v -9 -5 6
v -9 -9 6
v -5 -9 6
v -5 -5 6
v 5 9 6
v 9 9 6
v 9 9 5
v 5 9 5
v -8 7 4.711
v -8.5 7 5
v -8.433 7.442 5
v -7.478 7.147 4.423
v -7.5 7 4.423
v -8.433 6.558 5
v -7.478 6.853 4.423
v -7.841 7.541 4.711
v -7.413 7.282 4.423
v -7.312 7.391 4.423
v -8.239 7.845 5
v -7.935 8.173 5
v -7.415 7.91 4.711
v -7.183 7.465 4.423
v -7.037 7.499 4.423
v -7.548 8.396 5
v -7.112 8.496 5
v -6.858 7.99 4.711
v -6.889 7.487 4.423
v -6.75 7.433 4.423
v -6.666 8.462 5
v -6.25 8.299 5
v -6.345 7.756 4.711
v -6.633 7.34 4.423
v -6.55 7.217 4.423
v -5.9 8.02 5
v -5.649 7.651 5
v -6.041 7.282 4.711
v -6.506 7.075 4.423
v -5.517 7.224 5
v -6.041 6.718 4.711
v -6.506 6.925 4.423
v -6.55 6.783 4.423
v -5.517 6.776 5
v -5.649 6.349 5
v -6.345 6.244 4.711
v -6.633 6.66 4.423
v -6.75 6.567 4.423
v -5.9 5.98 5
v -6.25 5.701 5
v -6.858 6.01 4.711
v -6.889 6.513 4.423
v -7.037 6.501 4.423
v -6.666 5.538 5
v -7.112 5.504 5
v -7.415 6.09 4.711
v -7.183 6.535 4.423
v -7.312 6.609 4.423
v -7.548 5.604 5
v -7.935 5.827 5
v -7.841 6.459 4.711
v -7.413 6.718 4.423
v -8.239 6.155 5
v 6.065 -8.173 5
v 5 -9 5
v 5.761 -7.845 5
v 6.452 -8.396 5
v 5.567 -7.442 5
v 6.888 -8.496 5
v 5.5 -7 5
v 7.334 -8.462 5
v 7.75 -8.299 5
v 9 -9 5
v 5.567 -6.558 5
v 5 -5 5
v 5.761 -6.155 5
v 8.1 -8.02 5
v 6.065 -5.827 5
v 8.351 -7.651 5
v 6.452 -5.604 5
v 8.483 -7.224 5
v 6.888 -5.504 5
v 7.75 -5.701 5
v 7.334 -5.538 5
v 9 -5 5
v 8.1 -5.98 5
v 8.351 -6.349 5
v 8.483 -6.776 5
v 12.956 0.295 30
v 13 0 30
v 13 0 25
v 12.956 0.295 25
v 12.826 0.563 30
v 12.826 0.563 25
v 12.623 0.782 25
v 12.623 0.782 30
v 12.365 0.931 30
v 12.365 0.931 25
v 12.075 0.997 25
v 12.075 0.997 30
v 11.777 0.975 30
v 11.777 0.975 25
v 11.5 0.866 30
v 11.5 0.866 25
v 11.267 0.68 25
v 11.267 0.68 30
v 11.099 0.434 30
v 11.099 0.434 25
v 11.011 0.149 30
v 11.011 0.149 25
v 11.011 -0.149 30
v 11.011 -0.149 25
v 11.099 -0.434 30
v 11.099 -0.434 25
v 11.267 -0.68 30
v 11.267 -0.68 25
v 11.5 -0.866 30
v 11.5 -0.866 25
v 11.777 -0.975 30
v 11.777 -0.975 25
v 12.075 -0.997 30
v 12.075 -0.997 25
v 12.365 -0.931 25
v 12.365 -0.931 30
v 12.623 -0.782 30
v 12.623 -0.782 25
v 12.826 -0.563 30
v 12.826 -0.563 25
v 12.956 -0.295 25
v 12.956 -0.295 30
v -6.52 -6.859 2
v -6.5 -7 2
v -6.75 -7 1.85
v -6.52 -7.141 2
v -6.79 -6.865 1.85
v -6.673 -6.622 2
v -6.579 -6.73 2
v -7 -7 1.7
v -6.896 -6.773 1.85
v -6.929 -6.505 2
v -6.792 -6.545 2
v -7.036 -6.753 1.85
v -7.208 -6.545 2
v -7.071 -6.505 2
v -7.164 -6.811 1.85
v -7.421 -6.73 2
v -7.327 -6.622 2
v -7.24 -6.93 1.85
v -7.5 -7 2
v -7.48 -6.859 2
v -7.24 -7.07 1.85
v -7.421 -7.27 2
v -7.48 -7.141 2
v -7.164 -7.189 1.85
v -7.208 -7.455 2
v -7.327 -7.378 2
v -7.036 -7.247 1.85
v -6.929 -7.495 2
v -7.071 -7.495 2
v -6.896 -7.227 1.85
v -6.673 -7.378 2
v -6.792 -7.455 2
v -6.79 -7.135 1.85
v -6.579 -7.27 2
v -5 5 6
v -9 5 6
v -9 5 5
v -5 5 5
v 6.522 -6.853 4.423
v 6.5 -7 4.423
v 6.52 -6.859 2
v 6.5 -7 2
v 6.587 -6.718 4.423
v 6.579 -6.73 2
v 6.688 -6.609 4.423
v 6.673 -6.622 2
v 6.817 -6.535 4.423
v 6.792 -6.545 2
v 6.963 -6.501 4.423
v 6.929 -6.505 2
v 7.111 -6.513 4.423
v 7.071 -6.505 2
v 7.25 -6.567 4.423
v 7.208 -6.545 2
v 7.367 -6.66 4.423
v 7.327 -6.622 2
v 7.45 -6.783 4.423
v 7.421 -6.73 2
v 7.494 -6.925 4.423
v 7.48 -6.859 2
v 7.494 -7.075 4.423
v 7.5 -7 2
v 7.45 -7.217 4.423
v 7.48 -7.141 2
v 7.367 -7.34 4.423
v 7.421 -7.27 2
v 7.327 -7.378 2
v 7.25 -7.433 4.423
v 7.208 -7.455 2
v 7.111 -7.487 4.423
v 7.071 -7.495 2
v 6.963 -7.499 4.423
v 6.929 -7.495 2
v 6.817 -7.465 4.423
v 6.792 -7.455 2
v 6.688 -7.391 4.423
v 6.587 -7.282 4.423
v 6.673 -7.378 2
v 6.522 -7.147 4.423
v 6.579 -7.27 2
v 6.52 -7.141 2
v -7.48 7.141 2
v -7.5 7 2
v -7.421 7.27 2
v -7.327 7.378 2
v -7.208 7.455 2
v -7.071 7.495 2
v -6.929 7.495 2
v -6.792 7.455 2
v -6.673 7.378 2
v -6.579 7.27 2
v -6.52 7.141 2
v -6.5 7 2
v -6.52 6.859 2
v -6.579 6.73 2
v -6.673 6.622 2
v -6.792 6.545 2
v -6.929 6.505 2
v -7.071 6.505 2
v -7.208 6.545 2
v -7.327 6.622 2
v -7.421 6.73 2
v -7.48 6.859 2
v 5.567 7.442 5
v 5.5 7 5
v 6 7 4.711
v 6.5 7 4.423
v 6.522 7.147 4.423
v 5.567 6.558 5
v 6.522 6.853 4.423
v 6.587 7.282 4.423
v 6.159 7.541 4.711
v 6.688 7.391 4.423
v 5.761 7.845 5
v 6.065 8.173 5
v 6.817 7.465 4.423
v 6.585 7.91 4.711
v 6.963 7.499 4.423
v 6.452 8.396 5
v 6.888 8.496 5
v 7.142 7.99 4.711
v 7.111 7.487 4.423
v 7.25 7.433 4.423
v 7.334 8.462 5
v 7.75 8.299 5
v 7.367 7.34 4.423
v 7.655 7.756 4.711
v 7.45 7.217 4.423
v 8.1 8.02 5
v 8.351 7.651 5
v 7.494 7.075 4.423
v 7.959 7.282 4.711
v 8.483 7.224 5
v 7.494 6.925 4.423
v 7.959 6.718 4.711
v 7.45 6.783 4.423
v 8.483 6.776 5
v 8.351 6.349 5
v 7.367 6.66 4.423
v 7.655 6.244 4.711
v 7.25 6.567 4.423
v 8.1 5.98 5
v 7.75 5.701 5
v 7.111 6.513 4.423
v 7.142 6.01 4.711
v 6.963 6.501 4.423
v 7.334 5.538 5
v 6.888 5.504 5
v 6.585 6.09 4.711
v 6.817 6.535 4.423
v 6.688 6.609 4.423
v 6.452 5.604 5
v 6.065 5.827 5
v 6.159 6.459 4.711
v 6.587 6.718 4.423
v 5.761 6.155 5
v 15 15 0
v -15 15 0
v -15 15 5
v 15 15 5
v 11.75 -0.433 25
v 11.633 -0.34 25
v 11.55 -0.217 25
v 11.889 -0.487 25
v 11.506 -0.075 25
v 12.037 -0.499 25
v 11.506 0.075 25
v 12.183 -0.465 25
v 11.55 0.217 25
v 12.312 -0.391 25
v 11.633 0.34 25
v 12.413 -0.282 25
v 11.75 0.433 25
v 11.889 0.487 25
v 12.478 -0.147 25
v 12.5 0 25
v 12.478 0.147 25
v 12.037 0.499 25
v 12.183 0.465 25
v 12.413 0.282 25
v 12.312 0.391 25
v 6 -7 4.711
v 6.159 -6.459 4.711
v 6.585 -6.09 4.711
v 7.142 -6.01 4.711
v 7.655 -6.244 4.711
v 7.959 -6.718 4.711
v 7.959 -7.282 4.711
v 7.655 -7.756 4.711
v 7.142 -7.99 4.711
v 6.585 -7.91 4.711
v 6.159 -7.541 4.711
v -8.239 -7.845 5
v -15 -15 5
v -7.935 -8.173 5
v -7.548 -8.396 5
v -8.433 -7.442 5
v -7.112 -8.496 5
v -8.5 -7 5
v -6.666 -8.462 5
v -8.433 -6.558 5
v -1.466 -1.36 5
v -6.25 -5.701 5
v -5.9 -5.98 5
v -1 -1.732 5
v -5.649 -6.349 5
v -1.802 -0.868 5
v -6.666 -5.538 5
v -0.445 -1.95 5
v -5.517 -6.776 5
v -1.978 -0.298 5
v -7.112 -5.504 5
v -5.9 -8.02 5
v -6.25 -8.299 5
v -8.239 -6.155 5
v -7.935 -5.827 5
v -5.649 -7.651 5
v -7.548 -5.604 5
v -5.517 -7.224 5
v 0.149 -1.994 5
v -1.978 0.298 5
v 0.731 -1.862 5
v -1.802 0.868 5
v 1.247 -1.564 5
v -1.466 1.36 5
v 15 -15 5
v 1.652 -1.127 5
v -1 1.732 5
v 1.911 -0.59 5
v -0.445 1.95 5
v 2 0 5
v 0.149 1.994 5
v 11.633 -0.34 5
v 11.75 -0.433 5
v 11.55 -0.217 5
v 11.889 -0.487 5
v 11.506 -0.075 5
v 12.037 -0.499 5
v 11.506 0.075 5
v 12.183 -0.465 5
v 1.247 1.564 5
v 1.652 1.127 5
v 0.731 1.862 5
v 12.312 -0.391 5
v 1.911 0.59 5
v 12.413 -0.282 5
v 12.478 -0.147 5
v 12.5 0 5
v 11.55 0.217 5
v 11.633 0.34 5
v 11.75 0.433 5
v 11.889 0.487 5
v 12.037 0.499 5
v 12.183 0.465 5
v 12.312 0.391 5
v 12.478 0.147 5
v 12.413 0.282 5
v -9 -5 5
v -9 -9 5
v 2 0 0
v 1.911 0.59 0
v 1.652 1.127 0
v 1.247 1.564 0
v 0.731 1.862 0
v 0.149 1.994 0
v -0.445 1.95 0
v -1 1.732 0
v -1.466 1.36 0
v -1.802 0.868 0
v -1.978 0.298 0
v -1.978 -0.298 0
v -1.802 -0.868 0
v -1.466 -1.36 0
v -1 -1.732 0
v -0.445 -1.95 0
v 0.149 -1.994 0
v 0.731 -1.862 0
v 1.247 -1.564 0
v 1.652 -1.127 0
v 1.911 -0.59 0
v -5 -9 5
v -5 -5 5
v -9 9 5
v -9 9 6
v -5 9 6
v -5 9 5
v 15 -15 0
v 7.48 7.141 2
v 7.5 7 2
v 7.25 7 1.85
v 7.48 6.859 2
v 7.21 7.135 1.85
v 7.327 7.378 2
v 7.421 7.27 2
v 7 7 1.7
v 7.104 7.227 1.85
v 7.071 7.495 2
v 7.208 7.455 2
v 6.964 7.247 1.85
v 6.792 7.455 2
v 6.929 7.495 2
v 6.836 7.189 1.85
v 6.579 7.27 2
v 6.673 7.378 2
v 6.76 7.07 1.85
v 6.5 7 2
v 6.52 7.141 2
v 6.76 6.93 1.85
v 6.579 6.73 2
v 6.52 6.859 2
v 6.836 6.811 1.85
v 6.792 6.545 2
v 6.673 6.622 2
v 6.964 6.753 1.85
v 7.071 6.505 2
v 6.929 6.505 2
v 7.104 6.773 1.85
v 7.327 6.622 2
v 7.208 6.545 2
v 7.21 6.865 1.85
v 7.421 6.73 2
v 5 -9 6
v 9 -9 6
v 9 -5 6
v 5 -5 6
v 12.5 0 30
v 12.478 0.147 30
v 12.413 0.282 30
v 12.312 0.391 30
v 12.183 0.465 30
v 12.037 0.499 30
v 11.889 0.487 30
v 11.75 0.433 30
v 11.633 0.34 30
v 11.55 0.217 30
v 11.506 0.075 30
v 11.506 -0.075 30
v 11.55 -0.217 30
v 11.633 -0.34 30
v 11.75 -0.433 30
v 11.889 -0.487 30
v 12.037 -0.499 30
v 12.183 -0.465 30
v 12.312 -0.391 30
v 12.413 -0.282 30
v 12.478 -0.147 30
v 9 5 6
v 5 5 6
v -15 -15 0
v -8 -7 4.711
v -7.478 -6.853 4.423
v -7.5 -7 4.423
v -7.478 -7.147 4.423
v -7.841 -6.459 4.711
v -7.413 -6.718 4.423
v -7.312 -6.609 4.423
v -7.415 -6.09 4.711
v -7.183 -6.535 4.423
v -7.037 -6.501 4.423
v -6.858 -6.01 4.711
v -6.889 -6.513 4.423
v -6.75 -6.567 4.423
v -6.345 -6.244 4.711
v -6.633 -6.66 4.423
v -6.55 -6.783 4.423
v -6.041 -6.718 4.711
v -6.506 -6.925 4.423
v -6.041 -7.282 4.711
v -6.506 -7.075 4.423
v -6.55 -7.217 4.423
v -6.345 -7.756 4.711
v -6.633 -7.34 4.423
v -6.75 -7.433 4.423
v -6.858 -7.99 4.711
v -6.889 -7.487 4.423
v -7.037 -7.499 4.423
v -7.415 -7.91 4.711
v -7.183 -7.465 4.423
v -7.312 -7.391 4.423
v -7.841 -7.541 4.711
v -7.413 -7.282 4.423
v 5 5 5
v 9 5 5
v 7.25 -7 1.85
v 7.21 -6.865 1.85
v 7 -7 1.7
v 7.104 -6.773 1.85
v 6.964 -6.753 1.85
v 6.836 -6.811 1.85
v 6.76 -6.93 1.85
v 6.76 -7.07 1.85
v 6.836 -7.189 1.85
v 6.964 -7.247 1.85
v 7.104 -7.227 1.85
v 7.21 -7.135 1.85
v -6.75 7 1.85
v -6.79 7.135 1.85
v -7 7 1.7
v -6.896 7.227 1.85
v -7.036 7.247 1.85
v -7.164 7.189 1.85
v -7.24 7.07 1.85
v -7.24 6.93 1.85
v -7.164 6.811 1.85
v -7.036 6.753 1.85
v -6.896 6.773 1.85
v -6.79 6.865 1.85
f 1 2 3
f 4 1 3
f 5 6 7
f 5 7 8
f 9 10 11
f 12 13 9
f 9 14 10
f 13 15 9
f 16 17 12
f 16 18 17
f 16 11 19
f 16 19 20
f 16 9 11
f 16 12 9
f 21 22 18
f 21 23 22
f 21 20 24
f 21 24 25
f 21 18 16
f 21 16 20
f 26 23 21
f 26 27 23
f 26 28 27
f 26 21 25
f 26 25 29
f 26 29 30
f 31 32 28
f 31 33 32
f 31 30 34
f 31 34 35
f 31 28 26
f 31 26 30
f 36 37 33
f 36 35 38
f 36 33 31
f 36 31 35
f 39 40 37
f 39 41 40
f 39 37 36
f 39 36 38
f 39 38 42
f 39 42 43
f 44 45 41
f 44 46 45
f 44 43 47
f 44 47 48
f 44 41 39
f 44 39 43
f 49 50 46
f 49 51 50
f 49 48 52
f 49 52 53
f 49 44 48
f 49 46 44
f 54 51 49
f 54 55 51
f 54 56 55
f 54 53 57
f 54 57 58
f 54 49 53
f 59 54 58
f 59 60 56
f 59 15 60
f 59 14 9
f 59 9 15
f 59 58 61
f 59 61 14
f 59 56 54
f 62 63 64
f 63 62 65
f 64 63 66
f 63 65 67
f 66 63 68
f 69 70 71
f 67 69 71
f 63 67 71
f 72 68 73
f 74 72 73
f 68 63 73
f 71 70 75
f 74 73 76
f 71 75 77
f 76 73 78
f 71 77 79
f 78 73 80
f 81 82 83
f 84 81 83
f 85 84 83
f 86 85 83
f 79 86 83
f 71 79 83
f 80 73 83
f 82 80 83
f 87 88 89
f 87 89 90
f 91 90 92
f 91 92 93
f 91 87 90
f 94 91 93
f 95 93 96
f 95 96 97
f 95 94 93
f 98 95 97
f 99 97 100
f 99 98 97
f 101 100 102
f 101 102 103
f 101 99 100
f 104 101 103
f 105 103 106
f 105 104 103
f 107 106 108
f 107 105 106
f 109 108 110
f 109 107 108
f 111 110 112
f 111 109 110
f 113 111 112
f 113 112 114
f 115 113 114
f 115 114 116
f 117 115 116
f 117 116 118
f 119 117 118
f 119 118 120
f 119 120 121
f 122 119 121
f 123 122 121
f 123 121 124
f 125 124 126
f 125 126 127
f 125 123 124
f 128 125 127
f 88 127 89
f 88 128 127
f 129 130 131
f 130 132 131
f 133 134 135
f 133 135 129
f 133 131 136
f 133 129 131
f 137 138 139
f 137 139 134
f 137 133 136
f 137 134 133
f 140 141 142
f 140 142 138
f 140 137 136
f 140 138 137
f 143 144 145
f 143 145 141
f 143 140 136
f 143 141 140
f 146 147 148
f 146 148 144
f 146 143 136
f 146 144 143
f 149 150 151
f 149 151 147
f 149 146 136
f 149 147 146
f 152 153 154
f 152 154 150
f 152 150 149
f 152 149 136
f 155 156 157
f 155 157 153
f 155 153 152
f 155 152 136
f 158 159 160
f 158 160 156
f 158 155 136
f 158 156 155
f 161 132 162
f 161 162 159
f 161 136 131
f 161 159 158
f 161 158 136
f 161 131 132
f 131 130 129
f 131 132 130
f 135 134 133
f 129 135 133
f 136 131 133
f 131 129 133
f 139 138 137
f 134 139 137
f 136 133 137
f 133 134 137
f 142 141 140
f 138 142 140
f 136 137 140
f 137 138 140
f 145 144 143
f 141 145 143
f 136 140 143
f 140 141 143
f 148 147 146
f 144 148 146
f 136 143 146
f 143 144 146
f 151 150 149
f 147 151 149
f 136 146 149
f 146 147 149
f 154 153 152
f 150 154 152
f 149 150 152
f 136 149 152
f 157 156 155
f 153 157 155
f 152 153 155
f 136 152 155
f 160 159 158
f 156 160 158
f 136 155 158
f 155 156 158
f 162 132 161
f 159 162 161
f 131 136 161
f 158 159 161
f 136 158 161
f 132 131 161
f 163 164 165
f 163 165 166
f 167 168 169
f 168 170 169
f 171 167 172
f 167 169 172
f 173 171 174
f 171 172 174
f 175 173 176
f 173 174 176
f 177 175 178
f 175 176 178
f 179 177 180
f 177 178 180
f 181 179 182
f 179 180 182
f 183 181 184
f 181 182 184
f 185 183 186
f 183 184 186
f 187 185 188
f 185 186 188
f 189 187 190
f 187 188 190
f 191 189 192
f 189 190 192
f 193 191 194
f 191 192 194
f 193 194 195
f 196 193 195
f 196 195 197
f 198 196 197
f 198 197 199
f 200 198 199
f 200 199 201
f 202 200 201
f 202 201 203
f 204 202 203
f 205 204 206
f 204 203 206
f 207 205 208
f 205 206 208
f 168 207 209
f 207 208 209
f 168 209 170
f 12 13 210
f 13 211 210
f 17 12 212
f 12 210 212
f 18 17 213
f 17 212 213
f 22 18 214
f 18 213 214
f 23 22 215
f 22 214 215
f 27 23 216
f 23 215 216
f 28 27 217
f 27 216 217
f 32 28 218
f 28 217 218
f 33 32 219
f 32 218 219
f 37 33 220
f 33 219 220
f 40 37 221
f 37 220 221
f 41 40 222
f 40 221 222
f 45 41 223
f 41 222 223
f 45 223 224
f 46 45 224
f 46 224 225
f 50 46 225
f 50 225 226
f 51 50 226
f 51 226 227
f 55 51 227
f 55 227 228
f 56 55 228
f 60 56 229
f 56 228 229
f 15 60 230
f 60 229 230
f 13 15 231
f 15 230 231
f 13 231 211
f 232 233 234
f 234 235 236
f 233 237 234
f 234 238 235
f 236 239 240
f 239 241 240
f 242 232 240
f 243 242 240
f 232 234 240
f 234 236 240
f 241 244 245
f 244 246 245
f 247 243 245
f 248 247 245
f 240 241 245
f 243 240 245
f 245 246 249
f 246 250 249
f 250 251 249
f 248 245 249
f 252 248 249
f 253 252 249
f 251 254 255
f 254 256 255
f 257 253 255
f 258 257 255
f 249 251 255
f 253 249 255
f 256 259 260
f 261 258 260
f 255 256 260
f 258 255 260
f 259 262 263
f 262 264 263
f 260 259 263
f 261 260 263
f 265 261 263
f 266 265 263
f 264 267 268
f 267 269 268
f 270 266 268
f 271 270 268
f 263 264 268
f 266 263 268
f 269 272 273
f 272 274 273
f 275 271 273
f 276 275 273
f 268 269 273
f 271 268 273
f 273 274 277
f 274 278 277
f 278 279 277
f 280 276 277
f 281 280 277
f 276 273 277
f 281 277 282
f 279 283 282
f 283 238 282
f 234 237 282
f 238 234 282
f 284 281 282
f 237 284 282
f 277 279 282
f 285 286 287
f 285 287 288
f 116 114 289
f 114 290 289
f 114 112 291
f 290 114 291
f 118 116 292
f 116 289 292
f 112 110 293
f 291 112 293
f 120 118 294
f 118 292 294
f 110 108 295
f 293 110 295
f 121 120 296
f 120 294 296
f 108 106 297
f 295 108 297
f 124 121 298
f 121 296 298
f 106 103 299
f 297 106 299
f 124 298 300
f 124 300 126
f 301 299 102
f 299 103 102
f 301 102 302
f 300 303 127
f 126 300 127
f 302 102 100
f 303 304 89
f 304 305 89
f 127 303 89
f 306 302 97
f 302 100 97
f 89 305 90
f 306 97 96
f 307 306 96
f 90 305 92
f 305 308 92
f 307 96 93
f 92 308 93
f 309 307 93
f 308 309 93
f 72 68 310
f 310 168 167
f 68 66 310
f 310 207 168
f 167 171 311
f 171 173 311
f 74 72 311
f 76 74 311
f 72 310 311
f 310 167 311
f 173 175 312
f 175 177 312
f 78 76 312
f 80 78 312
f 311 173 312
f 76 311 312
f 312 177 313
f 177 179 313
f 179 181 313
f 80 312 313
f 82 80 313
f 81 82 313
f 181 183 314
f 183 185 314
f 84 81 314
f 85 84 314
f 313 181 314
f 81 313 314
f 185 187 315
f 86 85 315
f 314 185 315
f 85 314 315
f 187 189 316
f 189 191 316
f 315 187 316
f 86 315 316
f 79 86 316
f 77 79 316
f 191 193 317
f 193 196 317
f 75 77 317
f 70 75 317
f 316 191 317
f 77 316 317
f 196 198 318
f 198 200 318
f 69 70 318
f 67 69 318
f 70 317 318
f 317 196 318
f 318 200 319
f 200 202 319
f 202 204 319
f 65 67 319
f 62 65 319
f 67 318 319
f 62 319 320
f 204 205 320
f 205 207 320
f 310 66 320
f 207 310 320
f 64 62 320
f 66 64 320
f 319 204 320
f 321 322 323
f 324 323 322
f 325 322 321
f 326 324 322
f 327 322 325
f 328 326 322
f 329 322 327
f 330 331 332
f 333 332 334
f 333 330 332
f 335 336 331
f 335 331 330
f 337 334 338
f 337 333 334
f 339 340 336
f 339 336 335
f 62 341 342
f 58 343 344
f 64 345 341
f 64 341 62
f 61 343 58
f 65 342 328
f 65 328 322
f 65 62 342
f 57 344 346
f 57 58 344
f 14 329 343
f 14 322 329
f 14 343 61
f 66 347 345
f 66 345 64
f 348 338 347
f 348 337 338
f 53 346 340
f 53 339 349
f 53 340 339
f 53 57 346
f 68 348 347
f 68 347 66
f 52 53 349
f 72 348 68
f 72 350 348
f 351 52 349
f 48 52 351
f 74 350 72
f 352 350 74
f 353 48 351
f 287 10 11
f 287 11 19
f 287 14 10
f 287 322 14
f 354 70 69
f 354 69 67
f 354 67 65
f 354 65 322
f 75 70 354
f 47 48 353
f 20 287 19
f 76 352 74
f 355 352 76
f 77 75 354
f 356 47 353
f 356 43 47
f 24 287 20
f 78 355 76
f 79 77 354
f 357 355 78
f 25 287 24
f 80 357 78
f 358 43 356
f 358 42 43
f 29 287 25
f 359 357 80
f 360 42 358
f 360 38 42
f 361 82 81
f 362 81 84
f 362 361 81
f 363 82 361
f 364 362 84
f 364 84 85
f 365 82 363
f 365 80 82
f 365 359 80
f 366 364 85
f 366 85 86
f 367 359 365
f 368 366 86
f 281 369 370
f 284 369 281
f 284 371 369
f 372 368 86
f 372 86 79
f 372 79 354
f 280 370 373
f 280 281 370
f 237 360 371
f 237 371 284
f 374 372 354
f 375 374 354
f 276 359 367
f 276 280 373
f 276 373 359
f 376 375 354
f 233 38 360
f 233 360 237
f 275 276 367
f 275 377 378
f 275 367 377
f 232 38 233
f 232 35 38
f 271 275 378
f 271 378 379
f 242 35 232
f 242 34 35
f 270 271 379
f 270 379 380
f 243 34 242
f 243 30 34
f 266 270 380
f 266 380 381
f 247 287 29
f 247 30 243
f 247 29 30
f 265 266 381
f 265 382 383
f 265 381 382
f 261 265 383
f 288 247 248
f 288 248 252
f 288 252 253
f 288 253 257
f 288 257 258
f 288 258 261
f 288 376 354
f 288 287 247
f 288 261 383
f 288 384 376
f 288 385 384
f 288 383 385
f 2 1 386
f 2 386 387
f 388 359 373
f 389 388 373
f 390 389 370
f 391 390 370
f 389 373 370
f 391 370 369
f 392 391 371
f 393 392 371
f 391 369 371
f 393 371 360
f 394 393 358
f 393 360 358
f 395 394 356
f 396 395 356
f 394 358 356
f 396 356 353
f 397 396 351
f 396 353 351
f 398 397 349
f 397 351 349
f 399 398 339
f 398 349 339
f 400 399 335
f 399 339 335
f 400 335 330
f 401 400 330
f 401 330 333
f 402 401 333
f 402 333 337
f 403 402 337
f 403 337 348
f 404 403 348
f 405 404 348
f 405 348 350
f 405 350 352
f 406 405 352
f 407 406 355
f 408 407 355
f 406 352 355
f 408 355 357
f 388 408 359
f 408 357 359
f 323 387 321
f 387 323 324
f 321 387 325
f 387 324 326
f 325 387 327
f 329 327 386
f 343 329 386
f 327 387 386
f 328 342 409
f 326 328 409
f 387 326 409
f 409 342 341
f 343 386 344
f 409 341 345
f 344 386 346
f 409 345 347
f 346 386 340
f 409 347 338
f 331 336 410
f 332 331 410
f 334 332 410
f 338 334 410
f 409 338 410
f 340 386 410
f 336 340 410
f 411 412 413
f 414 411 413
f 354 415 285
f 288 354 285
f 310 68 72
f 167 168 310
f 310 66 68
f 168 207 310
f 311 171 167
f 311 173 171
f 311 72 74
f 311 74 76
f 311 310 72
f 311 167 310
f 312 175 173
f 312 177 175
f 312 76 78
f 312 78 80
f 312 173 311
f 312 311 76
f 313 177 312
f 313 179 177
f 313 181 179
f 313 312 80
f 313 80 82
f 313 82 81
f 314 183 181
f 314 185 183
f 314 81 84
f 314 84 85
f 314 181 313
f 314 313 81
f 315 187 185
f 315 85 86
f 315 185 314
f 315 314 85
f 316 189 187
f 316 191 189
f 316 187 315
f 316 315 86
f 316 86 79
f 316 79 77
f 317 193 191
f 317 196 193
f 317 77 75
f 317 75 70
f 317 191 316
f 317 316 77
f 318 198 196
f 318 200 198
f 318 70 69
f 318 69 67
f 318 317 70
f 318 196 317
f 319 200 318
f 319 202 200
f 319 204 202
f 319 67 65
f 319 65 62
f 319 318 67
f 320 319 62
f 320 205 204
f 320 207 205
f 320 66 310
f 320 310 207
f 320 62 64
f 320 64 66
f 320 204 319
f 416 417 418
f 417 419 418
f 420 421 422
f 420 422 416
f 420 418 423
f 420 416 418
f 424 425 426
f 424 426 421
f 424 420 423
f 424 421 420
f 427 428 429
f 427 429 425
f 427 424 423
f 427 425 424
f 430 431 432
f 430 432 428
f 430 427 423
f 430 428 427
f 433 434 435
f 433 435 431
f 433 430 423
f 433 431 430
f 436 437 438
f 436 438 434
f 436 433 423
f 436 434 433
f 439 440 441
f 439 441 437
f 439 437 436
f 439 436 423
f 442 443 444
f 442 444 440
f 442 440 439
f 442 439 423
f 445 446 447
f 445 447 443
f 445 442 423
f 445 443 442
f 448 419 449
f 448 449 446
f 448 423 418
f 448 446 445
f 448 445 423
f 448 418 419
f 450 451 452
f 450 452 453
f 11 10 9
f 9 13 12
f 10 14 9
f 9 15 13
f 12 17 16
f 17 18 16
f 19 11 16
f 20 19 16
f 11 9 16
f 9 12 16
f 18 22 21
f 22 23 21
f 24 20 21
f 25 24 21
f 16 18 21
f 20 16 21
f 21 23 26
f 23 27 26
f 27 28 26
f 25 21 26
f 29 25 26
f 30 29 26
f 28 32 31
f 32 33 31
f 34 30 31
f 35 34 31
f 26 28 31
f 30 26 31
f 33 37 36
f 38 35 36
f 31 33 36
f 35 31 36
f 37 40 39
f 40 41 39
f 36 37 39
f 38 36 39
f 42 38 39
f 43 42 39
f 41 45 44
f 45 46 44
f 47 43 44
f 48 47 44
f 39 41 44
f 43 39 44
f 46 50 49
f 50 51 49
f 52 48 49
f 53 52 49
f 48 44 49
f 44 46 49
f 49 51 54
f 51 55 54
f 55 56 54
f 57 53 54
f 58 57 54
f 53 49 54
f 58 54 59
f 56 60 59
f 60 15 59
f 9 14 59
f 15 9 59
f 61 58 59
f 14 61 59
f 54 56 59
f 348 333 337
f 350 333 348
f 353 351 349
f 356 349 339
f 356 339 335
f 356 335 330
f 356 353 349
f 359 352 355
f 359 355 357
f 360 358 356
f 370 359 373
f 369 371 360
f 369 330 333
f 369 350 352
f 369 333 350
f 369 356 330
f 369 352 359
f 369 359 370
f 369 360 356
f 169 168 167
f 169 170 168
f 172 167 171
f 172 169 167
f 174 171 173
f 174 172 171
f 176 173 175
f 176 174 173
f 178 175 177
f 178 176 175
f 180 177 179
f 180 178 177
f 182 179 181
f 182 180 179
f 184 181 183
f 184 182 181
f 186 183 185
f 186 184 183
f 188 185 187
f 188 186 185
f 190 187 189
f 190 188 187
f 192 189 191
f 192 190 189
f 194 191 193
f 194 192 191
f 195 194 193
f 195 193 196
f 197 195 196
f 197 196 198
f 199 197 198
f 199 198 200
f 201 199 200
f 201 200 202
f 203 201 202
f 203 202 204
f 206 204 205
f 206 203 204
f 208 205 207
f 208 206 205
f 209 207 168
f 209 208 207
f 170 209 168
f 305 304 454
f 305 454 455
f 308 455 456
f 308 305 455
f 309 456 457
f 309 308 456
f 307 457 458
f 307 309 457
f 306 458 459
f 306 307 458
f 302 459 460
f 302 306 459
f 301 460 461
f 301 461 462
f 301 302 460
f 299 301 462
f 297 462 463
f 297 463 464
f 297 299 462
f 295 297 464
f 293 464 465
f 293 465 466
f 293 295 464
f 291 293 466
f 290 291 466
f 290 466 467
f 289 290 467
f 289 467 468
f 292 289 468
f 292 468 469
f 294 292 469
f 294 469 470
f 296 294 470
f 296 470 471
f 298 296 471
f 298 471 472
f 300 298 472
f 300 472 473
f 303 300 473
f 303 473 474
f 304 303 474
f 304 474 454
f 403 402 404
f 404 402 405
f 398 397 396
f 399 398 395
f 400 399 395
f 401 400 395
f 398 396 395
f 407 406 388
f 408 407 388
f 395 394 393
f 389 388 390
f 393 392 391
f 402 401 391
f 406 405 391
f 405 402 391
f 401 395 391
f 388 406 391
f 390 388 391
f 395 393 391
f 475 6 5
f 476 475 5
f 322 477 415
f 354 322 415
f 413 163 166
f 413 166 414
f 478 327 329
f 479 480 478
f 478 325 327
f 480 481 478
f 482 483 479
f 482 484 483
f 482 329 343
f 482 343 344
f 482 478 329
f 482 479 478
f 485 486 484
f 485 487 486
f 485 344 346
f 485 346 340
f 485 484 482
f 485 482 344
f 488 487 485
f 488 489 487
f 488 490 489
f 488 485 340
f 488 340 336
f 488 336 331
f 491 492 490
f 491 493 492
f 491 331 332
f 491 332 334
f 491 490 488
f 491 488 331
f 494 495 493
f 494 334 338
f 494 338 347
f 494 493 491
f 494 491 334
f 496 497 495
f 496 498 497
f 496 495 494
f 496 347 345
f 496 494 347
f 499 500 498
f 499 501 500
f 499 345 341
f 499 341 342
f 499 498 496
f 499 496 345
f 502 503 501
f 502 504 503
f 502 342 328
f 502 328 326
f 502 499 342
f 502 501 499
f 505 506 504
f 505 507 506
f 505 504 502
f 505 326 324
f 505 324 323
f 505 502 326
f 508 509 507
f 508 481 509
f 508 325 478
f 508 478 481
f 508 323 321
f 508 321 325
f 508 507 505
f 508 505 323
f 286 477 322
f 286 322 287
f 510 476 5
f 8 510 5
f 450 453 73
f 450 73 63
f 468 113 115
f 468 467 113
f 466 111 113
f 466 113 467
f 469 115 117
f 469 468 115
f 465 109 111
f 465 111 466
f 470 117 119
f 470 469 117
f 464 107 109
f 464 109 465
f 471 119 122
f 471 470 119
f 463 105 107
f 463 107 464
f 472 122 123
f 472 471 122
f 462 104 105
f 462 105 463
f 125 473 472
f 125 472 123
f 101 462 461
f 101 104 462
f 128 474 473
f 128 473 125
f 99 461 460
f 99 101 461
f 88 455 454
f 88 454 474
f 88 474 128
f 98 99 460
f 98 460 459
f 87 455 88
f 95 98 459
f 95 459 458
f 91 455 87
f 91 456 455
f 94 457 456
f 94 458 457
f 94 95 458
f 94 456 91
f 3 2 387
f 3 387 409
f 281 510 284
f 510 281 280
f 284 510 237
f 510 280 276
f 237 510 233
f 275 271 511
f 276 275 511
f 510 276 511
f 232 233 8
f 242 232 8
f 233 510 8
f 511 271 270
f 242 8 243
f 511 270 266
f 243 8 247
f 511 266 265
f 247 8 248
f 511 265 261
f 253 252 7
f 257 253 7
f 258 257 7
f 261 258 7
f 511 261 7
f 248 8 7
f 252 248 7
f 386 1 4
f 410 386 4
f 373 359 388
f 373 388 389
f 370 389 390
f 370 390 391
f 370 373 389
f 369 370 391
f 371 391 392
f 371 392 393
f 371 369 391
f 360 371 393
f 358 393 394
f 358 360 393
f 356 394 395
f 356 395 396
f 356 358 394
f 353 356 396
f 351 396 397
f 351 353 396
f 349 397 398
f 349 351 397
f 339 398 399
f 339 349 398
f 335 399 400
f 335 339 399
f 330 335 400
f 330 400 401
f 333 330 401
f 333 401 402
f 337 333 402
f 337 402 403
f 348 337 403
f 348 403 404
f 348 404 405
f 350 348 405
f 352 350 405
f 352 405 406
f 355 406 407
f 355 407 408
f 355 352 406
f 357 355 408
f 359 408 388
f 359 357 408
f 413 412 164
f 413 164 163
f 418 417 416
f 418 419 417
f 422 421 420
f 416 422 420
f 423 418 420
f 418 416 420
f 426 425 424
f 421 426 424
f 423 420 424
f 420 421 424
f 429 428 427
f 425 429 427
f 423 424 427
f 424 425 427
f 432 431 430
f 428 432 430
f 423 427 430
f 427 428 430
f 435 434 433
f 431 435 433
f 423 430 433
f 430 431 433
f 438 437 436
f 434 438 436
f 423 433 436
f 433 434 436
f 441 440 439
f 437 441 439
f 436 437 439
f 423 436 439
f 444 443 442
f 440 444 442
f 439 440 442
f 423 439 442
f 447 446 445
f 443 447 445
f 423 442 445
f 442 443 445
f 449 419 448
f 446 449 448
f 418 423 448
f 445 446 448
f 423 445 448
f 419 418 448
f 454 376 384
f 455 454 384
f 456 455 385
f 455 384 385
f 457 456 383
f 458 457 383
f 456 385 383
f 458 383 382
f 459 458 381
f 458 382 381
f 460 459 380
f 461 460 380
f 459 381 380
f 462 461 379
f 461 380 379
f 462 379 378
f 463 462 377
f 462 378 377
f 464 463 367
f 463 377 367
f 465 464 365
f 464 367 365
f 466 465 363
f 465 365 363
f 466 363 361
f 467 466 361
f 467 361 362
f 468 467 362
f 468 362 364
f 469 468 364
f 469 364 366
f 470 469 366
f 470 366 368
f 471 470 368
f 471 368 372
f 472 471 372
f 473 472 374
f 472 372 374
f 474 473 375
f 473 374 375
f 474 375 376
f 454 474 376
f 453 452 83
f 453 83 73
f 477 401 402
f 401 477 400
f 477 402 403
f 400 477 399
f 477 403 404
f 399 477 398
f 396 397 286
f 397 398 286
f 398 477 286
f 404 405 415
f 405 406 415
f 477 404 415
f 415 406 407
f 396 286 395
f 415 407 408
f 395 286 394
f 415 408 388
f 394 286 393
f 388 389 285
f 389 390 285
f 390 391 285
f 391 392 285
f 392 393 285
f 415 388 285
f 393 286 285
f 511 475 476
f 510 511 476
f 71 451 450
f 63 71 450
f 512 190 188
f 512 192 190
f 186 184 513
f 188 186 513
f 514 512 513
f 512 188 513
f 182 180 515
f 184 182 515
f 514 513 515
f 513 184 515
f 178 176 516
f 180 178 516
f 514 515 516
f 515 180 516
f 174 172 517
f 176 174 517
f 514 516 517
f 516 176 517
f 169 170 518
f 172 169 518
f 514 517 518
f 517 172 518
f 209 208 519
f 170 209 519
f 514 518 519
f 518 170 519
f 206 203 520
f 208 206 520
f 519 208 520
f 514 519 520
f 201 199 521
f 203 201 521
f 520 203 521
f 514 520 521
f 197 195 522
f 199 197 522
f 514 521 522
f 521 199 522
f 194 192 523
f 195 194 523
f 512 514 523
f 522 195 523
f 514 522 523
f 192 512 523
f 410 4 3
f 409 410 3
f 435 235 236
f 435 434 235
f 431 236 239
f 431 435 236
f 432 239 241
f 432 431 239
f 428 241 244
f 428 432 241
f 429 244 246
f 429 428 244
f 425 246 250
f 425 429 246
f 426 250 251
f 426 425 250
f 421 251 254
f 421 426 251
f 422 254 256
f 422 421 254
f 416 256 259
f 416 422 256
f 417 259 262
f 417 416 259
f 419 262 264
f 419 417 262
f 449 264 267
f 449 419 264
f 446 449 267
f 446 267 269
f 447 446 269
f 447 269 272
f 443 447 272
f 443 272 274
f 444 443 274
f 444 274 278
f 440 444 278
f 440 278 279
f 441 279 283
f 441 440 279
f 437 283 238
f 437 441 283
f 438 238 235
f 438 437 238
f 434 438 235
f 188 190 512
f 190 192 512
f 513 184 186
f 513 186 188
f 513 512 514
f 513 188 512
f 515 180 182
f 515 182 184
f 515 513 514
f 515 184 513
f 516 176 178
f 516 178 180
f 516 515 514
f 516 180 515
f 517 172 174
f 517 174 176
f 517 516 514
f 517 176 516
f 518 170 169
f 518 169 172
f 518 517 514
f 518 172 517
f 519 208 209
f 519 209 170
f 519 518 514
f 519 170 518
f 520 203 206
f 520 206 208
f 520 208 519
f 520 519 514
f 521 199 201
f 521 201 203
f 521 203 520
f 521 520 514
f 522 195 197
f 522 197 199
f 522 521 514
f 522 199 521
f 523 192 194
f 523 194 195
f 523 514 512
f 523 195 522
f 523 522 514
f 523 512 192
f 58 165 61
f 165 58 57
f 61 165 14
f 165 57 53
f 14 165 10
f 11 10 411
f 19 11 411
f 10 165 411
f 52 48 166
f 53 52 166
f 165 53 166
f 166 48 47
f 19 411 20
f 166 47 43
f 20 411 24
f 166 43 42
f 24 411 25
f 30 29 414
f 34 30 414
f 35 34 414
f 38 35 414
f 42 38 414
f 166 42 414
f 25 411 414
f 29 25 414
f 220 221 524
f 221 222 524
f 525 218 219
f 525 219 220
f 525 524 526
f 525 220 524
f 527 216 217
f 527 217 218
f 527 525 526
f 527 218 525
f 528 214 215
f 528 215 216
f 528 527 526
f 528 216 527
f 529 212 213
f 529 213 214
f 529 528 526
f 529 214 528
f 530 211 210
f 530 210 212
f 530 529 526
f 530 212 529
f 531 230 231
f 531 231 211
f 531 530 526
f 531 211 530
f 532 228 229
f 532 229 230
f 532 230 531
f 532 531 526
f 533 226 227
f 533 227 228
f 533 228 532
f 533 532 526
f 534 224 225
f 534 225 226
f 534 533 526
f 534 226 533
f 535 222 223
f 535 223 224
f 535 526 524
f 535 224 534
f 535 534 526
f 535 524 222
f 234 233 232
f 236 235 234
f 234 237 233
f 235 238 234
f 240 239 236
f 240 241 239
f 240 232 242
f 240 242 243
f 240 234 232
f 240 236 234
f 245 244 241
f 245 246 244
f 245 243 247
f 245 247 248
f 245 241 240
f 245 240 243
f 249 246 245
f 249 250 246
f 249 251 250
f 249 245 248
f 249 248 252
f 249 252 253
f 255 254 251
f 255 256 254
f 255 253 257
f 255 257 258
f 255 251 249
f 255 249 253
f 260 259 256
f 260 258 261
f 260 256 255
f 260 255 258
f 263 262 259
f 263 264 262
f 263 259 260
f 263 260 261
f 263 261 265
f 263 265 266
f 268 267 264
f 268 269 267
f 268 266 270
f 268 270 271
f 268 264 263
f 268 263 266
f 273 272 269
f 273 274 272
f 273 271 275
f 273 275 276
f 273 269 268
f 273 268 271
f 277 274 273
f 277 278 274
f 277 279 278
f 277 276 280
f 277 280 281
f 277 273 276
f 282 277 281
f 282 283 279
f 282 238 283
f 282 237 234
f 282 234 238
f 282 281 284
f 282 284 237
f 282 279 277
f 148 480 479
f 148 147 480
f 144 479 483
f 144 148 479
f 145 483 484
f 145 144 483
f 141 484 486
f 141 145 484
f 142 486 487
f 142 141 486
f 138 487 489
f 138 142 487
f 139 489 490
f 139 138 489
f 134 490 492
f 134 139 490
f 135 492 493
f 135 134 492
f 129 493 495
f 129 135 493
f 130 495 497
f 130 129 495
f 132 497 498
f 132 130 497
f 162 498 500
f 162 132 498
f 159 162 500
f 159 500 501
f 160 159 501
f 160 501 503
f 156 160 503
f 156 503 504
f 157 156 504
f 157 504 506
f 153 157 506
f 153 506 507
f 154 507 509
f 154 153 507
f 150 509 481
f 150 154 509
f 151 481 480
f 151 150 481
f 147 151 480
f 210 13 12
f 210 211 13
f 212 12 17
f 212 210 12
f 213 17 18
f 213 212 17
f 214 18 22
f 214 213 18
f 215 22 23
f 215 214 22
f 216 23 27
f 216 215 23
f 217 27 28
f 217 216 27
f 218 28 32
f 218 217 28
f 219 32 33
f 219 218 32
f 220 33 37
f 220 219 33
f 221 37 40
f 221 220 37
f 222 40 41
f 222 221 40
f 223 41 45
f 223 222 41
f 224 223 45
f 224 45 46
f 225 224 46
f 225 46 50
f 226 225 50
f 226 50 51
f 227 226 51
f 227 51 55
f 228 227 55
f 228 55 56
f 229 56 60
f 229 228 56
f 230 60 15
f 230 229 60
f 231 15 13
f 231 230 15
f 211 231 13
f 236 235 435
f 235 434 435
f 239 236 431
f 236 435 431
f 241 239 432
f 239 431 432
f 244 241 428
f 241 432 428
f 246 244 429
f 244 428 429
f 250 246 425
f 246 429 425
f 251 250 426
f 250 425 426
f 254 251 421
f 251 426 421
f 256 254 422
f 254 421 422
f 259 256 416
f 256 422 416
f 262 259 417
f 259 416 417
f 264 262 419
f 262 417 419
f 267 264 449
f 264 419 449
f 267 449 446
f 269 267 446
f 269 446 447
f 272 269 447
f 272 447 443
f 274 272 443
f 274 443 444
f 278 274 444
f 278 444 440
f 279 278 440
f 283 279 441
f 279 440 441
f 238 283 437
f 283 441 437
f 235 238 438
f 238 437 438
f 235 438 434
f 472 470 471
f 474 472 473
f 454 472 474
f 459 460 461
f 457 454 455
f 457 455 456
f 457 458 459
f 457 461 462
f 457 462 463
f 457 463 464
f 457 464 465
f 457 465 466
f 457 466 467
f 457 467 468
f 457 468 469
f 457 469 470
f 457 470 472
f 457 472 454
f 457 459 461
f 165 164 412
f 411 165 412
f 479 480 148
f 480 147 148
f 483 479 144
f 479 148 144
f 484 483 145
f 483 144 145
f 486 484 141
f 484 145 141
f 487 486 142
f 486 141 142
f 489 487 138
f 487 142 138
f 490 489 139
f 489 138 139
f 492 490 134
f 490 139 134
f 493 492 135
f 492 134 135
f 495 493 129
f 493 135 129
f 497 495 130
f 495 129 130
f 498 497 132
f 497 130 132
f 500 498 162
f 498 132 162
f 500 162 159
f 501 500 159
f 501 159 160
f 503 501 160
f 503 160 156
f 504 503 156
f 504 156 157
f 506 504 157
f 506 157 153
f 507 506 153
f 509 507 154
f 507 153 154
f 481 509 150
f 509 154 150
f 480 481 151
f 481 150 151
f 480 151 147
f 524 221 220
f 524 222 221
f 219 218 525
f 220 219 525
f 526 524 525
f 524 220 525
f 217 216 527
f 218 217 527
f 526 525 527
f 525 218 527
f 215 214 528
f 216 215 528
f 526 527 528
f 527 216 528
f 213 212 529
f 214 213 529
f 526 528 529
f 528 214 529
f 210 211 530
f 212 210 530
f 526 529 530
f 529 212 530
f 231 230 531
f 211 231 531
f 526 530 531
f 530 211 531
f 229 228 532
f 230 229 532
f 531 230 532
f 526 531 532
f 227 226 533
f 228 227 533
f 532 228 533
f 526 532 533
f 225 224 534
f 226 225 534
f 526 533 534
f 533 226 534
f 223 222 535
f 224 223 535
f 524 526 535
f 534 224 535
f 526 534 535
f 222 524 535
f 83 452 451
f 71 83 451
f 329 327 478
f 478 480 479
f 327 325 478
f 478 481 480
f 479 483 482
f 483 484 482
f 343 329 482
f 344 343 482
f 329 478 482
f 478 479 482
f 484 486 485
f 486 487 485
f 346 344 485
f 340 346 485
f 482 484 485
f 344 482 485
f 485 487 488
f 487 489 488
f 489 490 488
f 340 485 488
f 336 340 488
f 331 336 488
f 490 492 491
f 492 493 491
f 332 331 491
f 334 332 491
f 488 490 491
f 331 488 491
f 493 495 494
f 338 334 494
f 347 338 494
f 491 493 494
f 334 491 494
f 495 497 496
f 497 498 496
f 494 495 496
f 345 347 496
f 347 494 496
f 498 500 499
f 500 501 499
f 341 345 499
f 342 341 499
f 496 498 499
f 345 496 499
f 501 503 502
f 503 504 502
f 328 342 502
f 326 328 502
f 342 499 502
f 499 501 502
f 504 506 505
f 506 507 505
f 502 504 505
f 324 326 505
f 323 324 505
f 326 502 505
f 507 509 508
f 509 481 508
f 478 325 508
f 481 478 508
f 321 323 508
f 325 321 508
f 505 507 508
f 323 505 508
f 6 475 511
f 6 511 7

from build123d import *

# Parameters (mm, degrees)
F0_W           = 30
F0_H           = 30
F1_DEPTH       = 5
F3_D           = 1
F3_DEPTH       = 3
F3_CSINK_D     = 3
F3_CSINK_ANGLE = 120
F3_TIP         = 0.3004303095
F5_W           = 4
F5_H           = 4
F6_DEPTH       = 6
F10_R          = 0.5
F11_DEPTH      = 25
F12_R          = 1
F13_DEPTH      = 5
F15_R          = 2
F16_DEPTH      = 5


with BuildPart() as f1:
    # F0 (on Top) → F1 (new body)
    with BuildSketch(Plane.XY):
        Rectangle(F0_W, F0_H)
    extrude(amount=F1_DEPTH)

    # F3
    with Locations(Plane.XY.offset(5)):
        with Locations((-7, 7), (-7, -7), (7, -7), (7, 7)):
            CounterSinkHole(F3_D / 2, F3_CSINK_D / 2, depth=F3_DEPTH, counter_sink_angle=F3_CSINK_ANGLE)
            with Locations((0, 0, -(F3_DEPTH + F3_TIP / 2))):  # 118° drill point
                Cone(0, F3_D / 2, F3_TIP, mode=Mode.SUBTRACT)


with BuildPart() as f6:
    # F5 (on offset) → F6 (new body, through all)
    with BuildSketch(Plane.XY.offset(6)):
        with Locations((-7, 7)):
            Rectangle(F5_W, F5_H)
    extrude(amount=-F6_DEPTH)


with BuildPart() as f7_1:
    # F7: instance of F6
    add(f6.part.mirror(Plane.YZ))


with BuildPart() as f8_1:
    # F8: instance of F6
    add(f6.part.mirror(Plane.XZ))

    # F9: cut F1
    add(f1.part, mode=Mode.SUBTRACT)


with BuildPart() as f8_2:
    # F8: instance of F7_1
    add(f7_1.part.mirror(Plane.XZ))

    # F9: cut F1
    add(f1.part, mode=Mode.SUBTRACT)


with BuildPart() as f6_1:
    add(f6.part)

    # F9: cut F1
    add(f1.part, mode=Mode.SUBTRACT)


with BuildPart() as f7_1_1:
    add(f7_1.part)

    # F9: cut F1
    add(f1.part, mode=Mode.SUBTRACT)


with BuildPart() as f1_1:
    add(f1.part)

    # F10 (on face) → F11 (join)
    with BuildSketch(Plane.XY.offset(5)):
        with Locations((12, 0)):
            Circle(F10_R)
    extrude(amount=F11_DEPTH)


with BuildPart() as f13:
    # F12 (on face) → F13 (new body)
    with BuildSketch(Plane.XY.offset(30)):
        with Locations((12, 0)):
            Circle(F12_R)
    extrude(amount=-F13_DEPTH)

    # F14: cut F1
    add(f1_1.part, mode=Mode.SUBTRACT)


with BuildPart() as f16:
    # F15 (on face) → F16 (new body, through all)
    with BuildSketch(Plane.XY.offset(5)):
        Circle(F15_R)
    extrude(amount=-F16_DEPTH)


with BuildPart() as f1_2:
    add(f1_1.part)

    # F17: cut F16
    add(f16.part, mode=Mode.SUBTRACT)


solid = Compound([f8_1.part, f8_2.part, f6_1.part, f7_1_1.part, f13.part, f16.part, f1_2.part])
